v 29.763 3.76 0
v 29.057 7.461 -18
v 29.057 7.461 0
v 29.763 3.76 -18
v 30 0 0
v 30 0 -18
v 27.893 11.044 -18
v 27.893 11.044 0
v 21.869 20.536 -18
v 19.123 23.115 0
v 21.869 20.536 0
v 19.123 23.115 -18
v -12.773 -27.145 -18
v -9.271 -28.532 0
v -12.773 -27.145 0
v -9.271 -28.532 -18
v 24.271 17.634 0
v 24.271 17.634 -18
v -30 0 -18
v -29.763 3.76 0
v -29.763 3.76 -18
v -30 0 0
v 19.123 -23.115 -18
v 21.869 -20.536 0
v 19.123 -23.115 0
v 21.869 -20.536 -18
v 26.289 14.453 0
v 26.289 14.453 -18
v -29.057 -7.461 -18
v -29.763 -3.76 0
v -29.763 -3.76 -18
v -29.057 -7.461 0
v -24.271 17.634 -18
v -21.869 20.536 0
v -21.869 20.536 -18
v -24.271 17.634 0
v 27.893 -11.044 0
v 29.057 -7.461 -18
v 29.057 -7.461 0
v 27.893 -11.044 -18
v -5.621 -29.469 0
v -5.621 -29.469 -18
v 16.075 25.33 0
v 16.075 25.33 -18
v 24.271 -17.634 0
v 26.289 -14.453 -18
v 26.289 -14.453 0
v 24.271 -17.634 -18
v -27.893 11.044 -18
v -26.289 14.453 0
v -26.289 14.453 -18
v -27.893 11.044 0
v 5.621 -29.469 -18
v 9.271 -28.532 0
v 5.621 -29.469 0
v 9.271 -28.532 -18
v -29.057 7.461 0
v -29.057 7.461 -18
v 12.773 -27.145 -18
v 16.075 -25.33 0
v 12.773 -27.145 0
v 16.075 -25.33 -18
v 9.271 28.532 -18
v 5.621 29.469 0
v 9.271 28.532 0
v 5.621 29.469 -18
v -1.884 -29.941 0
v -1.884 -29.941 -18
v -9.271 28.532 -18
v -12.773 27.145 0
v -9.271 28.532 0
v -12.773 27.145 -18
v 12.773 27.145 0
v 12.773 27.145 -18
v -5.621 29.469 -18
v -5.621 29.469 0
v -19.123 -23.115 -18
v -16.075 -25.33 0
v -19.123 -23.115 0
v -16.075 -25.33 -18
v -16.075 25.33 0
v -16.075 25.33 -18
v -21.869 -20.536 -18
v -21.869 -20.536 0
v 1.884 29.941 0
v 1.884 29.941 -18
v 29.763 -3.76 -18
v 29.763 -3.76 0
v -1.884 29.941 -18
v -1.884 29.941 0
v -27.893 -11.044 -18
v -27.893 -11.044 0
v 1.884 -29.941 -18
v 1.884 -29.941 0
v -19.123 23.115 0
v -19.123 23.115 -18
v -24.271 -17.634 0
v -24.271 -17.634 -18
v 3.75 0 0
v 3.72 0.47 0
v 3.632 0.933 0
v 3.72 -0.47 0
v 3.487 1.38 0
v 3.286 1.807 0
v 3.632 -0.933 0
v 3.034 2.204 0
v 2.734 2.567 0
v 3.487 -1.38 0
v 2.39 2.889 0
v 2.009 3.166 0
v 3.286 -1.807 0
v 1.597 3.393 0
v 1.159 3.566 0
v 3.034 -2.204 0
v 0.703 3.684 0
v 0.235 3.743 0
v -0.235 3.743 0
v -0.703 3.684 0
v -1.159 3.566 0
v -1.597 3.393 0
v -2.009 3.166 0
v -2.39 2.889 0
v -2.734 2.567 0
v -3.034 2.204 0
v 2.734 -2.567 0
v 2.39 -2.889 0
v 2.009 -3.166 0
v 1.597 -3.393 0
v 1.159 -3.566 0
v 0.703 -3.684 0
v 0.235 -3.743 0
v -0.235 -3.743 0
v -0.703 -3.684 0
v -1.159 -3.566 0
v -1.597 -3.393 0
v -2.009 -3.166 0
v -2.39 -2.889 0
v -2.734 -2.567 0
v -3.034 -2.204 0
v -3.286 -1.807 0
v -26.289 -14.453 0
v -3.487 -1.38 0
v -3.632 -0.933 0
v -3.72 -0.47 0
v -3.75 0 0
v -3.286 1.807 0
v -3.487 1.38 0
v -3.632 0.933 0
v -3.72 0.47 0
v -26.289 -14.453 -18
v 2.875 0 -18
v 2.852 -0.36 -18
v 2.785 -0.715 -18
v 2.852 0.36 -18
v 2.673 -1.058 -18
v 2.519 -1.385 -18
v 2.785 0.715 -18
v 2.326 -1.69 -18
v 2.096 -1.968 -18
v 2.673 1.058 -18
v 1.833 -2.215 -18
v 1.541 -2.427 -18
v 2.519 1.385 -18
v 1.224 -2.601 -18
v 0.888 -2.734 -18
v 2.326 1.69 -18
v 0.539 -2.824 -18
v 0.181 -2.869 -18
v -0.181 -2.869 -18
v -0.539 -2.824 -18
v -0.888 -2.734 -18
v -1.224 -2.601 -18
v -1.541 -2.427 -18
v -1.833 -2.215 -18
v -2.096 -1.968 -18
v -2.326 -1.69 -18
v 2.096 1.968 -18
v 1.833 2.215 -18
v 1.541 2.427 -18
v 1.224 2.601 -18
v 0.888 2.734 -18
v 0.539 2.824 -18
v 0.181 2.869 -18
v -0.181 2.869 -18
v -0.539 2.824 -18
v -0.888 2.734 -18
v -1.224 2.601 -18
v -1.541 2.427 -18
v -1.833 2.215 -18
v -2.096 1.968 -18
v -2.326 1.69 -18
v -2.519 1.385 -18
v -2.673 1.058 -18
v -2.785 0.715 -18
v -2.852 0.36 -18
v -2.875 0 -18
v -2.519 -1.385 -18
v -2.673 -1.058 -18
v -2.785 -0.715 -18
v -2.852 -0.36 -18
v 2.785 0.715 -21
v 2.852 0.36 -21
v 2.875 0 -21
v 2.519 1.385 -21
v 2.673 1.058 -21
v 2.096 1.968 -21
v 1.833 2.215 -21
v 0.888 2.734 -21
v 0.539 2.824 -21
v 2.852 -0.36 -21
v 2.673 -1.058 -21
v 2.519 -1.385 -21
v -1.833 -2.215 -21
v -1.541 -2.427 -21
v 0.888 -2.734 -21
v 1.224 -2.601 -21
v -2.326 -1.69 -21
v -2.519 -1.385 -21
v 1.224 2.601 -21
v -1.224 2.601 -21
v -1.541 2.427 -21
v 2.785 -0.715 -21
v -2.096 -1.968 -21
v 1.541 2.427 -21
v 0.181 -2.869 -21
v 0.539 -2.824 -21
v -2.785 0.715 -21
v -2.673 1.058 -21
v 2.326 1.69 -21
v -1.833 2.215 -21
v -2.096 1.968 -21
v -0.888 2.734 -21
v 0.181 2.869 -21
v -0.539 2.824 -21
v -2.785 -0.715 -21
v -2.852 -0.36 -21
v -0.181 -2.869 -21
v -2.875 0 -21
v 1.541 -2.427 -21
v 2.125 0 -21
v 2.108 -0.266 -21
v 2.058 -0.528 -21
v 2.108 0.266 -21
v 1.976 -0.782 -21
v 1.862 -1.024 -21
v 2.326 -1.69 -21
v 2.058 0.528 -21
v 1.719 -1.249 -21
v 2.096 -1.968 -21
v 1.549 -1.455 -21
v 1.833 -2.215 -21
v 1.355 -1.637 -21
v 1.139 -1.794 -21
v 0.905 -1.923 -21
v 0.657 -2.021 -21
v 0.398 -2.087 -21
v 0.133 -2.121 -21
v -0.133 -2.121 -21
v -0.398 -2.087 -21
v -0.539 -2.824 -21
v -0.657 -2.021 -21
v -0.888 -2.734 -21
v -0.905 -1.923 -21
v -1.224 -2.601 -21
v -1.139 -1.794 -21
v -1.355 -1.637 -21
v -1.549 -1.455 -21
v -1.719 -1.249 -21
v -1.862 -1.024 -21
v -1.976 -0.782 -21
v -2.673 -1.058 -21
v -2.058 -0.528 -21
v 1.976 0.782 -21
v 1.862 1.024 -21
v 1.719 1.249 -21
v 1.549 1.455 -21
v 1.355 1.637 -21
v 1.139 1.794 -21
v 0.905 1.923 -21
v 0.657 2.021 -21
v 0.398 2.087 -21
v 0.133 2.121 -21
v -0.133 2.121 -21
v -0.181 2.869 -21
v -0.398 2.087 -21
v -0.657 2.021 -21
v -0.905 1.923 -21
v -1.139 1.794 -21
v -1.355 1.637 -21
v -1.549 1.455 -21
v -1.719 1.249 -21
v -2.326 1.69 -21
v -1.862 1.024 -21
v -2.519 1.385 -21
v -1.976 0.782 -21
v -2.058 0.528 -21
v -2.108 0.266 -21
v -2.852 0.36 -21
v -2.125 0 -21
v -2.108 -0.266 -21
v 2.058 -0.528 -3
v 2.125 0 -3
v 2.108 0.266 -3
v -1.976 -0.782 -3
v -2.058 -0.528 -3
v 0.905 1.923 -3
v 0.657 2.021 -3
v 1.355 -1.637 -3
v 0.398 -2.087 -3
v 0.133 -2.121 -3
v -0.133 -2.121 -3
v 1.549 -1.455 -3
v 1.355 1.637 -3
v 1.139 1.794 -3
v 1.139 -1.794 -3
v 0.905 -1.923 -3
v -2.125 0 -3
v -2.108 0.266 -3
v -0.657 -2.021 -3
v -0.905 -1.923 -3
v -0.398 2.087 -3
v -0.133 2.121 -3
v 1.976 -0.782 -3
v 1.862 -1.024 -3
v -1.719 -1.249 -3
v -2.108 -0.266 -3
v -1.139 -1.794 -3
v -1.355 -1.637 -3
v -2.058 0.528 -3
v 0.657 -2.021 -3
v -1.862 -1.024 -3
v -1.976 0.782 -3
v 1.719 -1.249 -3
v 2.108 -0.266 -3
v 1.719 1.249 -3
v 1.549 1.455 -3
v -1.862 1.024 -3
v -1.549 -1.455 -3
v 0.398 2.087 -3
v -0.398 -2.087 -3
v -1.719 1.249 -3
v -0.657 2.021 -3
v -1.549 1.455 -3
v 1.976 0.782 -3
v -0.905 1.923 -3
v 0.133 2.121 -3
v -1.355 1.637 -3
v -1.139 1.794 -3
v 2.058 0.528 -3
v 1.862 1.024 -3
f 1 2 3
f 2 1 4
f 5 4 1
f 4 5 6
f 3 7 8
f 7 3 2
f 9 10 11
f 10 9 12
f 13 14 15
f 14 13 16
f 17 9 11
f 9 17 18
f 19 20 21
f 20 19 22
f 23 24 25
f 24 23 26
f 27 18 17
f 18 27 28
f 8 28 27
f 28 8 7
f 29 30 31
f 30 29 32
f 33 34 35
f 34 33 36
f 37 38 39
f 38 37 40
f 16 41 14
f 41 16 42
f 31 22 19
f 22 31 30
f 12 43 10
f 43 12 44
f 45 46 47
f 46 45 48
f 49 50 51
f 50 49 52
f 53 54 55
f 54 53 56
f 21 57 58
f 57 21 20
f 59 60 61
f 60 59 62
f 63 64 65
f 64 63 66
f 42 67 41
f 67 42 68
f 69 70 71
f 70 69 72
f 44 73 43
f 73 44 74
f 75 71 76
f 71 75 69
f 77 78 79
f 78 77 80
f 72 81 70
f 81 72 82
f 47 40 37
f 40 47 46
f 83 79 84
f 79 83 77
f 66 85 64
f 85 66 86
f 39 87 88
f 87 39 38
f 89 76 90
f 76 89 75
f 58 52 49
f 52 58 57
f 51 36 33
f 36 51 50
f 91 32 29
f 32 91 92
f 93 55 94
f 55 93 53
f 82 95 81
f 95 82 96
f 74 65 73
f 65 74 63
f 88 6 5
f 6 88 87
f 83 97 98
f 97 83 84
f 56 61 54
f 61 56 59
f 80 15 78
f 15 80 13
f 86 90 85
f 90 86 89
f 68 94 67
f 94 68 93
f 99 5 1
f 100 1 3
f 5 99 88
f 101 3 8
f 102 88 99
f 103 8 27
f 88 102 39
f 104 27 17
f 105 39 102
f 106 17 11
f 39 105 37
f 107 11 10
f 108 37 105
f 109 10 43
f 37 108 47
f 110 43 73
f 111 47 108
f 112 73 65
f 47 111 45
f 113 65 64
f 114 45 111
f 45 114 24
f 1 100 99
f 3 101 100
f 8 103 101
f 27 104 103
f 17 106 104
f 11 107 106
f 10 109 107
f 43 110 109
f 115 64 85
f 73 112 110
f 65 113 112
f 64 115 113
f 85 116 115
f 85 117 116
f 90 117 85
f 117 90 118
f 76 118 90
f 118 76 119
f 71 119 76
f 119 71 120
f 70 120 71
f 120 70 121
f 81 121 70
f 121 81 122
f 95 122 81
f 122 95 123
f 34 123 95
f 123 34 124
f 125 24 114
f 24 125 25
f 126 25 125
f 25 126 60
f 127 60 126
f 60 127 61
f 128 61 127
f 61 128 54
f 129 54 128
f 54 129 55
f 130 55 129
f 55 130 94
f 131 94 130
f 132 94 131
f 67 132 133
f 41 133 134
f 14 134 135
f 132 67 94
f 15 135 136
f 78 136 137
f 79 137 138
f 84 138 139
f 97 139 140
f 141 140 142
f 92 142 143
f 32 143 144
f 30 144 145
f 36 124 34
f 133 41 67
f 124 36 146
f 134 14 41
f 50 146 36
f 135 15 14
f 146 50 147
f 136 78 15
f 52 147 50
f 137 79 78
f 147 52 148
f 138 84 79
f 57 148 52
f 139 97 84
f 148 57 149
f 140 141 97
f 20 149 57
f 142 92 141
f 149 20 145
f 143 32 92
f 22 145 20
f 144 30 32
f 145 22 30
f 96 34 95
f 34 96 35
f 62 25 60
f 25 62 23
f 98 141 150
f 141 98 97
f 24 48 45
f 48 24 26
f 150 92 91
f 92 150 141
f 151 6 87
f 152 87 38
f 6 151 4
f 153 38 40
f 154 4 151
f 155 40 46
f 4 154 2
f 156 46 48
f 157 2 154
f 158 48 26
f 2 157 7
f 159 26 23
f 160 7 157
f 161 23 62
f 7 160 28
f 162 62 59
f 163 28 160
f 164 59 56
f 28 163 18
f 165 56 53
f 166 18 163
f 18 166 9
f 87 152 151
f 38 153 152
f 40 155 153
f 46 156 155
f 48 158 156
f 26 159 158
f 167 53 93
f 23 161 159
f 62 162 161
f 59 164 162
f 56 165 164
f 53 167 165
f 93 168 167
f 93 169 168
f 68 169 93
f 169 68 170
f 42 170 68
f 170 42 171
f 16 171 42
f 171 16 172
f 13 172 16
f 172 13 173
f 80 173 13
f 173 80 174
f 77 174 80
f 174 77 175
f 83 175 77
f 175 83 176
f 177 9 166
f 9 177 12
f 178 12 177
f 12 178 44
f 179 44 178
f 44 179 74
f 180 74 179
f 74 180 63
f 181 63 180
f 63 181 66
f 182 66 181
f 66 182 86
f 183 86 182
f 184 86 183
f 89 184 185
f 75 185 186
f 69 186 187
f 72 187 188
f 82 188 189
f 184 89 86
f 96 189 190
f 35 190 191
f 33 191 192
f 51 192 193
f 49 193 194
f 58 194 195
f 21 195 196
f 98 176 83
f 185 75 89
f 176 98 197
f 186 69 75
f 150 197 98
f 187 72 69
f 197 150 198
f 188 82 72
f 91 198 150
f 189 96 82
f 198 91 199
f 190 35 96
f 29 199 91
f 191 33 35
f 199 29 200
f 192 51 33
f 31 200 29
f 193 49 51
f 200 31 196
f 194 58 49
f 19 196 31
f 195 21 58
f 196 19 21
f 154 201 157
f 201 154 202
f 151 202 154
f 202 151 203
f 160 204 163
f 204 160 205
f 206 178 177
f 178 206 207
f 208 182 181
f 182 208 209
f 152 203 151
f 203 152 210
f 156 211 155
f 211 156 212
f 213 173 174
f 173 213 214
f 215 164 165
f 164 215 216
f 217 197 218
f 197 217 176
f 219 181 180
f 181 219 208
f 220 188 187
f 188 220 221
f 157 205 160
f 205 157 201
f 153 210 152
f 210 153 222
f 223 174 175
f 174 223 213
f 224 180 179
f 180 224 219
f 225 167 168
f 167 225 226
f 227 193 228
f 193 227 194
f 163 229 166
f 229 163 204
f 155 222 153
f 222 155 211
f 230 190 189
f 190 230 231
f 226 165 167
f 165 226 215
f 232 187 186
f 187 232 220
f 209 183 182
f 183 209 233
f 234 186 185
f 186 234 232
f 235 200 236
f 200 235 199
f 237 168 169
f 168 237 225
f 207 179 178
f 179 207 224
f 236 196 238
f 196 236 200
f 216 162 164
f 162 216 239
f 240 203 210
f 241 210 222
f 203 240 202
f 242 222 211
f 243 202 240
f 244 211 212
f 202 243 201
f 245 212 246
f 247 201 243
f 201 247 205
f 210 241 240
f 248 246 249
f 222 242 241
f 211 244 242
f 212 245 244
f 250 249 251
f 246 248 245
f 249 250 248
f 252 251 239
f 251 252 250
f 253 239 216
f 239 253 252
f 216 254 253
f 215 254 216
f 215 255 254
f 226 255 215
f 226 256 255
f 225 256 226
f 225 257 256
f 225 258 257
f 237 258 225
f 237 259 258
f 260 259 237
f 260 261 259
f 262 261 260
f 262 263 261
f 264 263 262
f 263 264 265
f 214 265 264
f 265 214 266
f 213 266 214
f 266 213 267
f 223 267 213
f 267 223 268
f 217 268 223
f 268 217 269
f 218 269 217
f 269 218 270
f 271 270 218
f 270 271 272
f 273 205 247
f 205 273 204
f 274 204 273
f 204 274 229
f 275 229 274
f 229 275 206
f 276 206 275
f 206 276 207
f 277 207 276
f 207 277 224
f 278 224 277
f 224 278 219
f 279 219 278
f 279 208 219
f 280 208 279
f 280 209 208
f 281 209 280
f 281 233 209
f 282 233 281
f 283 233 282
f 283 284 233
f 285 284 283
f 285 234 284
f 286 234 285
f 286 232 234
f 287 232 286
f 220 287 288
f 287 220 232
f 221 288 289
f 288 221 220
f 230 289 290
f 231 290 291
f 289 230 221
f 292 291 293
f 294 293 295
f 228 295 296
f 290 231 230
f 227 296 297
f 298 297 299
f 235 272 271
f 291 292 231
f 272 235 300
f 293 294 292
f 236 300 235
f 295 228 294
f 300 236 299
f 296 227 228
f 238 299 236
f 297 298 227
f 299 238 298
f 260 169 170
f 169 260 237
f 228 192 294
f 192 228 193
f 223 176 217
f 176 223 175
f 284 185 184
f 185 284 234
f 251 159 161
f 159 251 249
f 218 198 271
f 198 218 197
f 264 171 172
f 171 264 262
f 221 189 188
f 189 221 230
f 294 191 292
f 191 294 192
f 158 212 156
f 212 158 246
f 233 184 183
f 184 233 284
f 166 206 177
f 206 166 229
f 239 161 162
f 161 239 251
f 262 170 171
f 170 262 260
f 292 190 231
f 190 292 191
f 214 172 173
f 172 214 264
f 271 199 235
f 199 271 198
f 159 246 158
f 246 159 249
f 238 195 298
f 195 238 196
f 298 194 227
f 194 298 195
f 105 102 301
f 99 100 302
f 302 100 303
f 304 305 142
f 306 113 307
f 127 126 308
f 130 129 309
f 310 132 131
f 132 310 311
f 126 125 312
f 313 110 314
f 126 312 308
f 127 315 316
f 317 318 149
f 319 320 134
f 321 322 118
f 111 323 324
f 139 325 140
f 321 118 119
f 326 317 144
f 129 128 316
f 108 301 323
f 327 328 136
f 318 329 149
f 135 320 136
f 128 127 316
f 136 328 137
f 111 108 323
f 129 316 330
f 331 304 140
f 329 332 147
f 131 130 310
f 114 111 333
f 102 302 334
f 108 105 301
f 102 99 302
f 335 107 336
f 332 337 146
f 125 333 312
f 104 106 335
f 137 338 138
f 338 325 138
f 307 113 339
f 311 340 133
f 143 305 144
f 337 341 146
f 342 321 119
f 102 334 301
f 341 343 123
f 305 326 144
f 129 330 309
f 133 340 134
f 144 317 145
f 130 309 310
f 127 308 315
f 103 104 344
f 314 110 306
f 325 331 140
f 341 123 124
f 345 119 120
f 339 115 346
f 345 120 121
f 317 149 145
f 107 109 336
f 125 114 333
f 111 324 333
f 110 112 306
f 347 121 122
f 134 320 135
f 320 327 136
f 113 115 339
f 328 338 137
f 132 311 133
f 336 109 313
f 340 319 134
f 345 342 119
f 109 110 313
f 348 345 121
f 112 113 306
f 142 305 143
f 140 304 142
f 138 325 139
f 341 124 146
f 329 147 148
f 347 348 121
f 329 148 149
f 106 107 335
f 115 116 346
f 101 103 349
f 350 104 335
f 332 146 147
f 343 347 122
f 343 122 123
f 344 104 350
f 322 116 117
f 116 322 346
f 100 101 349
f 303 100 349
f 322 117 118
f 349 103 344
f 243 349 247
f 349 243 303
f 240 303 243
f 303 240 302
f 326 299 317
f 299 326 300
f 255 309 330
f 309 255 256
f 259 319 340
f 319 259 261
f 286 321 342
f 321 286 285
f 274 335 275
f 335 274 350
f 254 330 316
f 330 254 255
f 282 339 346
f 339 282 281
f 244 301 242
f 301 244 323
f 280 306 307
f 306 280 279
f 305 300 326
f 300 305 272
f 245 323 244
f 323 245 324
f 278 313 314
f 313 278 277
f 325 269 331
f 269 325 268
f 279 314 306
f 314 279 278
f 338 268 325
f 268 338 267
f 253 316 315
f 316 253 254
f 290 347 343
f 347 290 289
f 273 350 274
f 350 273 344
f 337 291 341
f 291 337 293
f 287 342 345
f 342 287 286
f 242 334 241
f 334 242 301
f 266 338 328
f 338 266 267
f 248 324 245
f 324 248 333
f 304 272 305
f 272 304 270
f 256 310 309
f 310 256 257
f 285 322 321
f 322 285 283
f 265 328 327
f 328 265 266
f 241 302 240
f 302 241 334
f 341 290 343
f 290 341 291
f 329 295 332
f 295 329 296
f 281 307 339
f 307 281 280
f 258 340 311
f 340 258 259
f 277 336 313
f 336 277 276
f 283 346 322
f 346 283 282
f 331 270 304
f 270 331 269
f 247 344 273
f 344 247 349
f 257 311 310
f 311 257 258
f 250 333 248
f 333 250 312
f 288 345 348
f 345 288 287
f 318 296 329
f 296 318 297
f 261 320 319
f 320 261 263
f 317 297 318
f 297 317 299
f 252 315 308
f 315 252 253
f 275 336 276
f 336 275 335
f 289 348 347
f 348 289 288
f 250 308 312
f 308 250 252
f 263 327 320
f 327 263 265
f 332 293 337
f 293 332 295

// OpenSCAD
$fn = 50;


difference() {
	union() {
		translate(v = [0, 0, -18.0000000000]) {
			cylinder(h = 18, r = 30.0000000000);
		}
		#translate(v = [0, 0, -21.0000000000]) {
			cylinder(h = 21, r = 2.8750000000);
		}
	}
	union() {
		translate(v = [0, 0, 0]) {
			rotate(a = [0, 0, 0]) {
				difference() {
					union() {
						translate(v = [0, 0, -21.0000000000]) {
							cylinder(h = 21, r = 2.0000000000);
						}
						translate(v = [0, 0, -3]) {
							cylinder(h = 3, r1 = 2.1250000000, r2 = 3.7500000000);
						}
						translate(v = [0, 0, -21.0000000000]) {
							cylinder(h = 21, r = 2.1250000000);
						}
						translate(v = [0, 0, -21.0000000000]) {
							cylinder(h = 21, r = 2.0000000000);
						}
					}
					union();
				}
			}
		}
	}
}
